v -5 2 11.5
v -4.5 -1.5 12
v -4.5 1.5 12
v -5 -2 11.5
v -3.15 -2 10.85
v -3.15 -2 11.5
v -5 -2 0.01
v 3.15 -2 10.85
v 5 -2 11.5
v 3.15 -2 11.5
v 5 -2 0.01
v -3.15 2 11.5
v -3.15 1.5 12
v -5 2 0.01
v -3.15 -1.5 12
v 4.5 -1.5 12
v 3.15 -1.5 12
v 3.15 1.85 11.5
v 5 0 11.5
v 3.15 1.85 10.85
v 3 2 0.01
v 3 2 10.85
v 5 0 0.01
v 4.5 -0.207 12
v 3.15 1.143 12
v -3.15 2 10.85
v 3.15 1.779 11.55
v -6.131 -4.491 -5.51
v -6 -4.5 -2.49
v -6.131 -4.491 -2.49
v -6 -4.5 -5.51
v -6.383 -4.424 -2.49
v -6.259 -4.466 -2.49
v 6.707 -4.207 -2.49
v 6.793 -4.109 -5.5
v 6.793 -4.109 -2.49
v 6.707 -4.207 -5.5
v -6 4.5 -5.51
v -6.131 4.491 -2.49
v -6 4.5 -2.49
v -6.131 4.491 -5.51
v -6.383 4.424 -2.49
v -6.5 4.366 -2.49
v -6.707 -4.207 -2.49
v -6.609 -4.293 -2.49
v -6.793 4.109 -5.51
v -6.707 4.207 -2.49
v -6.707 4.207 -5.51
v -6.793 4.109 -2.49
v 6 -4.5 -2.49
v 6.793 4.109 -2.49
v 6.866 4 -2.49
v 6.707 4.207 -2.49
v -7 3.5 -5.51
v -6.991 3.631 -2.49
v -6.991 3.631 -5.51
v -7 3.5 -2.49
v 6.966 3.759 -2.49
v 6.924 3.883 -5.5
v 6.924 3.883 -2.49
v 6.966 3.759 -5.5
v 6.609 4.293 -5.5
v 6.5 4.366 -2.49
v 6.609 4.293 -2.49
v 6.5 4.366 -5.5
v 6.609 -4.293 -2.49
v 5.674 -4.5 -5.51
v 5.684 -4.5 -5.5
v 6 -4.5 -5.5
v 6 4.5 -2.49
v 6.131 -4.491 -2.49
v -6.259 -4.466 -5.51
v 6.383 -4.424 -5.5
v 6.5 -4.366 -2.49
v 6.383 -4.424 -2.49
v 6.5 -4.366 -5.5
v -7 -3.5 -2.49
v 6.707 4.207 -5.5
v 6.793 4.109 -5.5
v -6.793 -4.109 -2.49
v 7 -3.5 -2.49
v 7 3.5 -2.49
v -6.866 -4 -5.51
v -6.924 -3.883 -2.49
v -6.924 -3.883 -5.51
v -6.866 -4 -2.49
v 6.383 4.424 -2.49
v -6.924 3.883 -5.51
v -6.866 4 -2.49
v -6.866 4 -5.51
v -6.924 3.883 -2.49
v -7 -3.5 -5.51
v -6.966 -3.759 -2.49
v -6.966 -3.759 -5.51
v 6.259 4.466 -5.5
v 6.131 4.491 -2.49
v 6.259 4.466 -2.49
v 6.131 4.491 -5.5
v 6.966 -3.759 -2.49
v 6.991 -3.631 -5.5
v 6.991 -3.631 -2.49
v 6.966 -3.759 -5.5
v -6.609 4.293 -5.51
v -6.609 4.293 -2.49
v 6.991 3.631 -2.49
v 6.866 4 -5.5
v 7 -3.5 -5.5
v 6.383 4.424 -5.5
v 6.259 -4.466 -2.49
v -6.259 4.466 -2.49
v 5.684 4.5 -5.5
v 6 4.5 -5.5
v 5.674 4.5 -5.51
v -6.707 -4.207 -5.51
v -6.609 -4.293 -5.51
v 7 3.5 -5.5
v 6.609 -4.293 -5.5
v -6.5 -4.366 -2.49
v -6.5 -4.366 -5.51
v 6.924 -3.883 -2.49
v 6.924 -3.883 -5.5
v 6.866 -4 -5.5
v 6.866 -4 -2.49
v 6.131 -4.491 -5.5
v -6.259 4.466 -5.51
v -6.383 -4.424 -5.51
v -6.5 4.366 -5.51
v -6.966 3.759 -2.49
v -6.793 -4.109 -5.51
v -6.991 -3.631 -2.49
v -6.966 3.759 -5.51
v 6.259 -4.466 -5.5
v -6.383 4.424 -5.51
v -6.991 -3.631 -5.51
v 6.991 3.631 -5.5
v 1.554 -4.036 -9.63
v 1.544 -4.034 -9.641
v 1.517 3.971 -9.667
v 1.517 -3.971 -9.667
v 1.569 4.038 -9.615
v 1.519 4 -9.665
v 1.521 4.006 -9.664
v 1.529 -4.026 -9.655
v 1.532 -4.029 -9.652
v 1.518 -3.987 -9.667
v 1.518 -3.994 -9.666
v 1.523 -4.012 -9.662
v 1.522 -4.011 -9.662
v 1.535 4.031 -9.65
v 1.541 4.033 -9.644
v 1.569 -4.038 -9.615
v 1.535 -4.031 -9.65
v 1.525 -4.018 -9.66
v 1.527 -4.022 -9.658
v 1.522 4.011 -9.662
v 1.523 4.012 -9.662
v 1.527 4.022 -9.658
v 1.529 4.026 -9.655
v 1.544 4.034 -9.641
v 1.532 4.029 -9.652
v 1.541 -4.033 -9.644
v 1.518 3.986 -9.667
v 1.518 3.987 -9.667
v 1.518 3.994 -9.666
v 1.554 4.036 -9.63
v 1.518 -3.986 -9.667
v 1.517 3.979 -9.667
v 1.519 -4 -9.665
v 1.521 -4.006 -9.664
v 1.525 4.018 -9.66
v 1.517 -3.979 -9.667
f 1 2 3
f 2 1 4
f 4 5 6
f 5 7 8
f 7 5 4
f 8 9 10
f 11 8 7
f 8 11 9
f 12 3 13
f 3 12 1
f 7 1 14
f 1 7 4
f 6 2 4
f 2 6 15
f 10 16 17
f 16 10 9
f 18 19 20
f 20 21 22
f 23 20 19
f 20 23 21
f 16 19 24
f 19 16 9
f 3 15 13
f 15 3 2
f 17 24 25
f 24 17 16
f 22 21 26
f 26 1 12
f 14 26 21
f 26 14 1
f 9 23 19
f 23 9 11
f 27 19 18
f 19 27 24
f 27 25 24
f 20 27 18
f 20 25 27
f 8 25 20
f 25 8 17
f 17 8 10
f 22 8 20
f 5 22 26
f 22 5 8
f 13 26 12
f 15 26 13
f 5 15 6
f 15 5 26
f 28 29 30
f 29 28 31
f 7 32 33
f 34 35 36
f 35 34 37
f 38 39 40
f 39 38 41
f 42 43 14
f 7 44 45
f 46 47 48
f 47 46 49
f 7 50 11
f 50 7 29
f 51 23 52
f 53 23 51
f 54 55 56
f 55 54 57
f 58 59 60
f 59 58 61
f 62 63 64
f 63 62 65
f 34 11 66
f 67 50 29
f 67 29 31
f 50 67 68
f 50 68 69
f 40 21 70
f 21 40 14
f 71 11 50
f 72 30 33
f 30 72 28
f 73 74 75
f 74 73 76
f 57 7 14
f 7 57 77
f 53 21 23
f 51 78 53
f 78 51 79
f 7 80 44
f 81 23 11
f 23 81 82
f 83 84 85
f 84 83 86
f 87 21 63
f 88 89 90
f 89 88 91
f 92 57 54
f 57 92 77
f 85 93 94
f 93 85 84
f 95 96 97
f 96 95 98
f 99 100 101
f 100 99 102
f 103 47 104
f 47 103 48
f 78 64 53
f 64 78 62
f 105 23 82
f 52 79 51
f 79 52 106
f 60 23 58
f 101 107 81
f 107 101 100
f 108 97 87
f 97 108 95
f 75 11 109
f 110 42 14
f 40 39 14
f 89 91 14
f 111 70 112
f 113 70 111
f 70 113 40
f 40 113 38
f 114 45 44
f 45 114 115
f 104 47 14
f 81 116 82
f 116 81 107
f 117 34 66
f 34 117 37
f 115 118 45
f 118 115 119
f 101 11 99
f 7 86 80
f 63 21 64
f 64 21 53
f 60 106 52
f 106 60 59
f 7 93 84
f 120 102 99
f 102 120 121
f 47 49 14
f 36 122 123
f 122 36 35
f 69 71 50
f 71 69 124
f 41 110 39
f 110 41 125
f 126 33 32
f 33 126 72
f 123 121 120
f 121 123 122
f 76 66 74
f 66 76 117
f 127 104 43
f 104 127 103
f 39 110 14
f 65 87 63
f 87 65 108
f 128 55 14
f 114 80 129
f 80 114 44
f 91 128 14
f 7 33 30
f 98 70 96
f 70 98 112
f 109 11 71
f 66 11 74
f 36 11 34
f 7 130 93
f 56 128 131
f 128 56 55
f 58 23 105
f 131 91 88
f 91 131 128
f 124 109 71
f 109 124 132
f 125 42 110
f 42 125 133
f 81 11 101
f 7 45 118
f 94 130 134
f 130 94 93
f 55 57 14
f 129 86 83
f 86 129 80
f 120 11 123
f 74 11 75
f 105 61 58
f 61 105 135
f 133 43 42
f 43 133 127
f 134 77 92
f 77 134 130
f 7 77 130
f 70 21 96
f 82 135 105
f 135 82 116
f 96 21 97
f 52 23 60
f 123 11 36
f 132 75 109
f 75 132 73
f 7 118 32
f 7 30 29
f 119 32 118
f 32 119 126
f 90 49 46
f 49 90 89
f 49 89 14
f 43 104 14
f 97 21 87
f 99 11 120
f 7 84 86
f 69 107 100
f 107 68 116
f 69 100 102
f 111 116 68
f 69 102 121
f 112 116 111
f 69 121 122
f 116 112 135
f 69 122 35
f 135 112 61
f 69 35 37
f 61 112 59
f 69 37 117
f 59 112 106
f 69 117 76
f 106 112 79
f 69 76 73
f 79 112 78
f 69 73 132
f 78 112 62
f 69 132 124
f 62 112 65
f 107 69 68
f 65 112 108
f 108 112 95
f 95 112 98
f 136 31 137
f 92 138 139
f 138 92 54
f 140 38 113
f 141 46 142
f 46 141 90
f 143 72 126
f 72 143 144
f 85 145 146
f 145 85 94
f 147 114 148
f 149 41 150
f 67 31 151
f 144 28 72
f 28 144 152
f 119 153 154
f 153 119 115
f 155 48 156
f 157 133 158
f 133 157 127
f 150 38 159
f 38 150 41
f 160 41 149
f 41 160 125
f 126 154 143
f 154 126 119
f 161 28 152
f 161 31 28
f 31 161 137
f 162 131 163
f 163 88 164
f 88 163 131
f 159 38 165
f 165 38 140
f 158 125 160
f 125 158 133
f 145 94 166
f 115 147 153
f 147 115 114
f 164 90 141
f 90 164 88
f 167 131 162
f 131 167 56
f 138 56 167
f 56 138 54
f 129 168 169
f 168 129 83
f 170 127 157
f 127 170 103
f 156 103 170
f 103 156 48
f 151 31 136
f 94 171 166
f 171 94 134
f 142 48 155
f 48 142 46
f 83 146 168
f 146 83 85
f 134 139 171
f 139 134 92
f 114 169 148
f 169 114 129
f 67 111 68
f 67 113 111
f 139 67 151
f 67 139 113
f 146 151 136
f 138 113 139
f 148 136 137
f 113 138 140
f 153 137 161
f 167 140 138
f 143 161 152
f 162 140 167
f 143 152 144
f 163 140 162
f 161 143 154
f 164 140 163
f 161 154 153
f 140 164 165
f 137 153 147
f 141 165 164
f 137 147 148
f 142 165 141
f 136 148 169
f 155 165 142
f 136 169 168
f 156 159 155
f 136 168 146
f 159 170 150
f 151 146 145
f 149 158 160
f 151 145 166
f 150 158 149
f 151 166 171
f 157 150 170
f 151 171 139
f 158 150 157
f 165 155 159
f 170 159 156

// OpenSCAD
// =====================================================================
//  tip_A45.scad — SP1 tip A45: nail-mimic 45 deg, R 0.3 mm (EXPERIMENTAL, GATED)
//  PROJECT SCRATCH · 05-engineering/cad/tips · units: mm
//  R 0.3 is below safety red line 11 (tips >= 0.4 mm): HUMAN USE ONLY after the
//  forearm screen AND the UL 1439-style tape test (tips.md §2.4, §2.7).
//  Default route is a CARRIER ("slot" mode): CA-bond a 0.8 mm nylon sheet blade
//  (or a Dunlop nylon .88 pick) cut to 8 x 9 mm with a convex R 9 end, then file
//  the edge to R 0.3 (two 0.3 mm chamfers blended; 0.2 mm flats remain).
//  "printed" mode makes a 0.8 mm PETG plate (2 perimeters) — fragile; carrier preferred.
//  Slot mode (rev 2026-10-01): the carrier now has a true 45 deg bonding face in the
//  plane of the sheet's upper face; butt the sheet's top end against the band.
//  Loaded sense +X.  Print the carrier tang down, 0.10 mm layers.
// =====================================================================
include <tm1_tang_lib.scad>
$fn = TM1_FN;

BLADE_W    = 8.0;
BLADE_R    = 0.4;        // half of the 0.8 mm sheet; the EDGE is hand-filed to R 0.3
ATTACK     = 45;
DROP       = 7.0;
BLADE_MODE = "slot";     // "slot" (carrier for sheet blade) | "printed"
CROSS_HOLE = false;

module tip_A45(w = BLADE_W, r = BLADE_R, attack = ATTACK, drop = DROP,
               mode = BLADE_MODE, cross_hole = CROSS_HOLE) {
    tm1_tip_base(cross_hole);
    tm1_nail_blade(w = w, r = r, attack = attack, drop = drop, mode = mode);
}

tip_A45();
